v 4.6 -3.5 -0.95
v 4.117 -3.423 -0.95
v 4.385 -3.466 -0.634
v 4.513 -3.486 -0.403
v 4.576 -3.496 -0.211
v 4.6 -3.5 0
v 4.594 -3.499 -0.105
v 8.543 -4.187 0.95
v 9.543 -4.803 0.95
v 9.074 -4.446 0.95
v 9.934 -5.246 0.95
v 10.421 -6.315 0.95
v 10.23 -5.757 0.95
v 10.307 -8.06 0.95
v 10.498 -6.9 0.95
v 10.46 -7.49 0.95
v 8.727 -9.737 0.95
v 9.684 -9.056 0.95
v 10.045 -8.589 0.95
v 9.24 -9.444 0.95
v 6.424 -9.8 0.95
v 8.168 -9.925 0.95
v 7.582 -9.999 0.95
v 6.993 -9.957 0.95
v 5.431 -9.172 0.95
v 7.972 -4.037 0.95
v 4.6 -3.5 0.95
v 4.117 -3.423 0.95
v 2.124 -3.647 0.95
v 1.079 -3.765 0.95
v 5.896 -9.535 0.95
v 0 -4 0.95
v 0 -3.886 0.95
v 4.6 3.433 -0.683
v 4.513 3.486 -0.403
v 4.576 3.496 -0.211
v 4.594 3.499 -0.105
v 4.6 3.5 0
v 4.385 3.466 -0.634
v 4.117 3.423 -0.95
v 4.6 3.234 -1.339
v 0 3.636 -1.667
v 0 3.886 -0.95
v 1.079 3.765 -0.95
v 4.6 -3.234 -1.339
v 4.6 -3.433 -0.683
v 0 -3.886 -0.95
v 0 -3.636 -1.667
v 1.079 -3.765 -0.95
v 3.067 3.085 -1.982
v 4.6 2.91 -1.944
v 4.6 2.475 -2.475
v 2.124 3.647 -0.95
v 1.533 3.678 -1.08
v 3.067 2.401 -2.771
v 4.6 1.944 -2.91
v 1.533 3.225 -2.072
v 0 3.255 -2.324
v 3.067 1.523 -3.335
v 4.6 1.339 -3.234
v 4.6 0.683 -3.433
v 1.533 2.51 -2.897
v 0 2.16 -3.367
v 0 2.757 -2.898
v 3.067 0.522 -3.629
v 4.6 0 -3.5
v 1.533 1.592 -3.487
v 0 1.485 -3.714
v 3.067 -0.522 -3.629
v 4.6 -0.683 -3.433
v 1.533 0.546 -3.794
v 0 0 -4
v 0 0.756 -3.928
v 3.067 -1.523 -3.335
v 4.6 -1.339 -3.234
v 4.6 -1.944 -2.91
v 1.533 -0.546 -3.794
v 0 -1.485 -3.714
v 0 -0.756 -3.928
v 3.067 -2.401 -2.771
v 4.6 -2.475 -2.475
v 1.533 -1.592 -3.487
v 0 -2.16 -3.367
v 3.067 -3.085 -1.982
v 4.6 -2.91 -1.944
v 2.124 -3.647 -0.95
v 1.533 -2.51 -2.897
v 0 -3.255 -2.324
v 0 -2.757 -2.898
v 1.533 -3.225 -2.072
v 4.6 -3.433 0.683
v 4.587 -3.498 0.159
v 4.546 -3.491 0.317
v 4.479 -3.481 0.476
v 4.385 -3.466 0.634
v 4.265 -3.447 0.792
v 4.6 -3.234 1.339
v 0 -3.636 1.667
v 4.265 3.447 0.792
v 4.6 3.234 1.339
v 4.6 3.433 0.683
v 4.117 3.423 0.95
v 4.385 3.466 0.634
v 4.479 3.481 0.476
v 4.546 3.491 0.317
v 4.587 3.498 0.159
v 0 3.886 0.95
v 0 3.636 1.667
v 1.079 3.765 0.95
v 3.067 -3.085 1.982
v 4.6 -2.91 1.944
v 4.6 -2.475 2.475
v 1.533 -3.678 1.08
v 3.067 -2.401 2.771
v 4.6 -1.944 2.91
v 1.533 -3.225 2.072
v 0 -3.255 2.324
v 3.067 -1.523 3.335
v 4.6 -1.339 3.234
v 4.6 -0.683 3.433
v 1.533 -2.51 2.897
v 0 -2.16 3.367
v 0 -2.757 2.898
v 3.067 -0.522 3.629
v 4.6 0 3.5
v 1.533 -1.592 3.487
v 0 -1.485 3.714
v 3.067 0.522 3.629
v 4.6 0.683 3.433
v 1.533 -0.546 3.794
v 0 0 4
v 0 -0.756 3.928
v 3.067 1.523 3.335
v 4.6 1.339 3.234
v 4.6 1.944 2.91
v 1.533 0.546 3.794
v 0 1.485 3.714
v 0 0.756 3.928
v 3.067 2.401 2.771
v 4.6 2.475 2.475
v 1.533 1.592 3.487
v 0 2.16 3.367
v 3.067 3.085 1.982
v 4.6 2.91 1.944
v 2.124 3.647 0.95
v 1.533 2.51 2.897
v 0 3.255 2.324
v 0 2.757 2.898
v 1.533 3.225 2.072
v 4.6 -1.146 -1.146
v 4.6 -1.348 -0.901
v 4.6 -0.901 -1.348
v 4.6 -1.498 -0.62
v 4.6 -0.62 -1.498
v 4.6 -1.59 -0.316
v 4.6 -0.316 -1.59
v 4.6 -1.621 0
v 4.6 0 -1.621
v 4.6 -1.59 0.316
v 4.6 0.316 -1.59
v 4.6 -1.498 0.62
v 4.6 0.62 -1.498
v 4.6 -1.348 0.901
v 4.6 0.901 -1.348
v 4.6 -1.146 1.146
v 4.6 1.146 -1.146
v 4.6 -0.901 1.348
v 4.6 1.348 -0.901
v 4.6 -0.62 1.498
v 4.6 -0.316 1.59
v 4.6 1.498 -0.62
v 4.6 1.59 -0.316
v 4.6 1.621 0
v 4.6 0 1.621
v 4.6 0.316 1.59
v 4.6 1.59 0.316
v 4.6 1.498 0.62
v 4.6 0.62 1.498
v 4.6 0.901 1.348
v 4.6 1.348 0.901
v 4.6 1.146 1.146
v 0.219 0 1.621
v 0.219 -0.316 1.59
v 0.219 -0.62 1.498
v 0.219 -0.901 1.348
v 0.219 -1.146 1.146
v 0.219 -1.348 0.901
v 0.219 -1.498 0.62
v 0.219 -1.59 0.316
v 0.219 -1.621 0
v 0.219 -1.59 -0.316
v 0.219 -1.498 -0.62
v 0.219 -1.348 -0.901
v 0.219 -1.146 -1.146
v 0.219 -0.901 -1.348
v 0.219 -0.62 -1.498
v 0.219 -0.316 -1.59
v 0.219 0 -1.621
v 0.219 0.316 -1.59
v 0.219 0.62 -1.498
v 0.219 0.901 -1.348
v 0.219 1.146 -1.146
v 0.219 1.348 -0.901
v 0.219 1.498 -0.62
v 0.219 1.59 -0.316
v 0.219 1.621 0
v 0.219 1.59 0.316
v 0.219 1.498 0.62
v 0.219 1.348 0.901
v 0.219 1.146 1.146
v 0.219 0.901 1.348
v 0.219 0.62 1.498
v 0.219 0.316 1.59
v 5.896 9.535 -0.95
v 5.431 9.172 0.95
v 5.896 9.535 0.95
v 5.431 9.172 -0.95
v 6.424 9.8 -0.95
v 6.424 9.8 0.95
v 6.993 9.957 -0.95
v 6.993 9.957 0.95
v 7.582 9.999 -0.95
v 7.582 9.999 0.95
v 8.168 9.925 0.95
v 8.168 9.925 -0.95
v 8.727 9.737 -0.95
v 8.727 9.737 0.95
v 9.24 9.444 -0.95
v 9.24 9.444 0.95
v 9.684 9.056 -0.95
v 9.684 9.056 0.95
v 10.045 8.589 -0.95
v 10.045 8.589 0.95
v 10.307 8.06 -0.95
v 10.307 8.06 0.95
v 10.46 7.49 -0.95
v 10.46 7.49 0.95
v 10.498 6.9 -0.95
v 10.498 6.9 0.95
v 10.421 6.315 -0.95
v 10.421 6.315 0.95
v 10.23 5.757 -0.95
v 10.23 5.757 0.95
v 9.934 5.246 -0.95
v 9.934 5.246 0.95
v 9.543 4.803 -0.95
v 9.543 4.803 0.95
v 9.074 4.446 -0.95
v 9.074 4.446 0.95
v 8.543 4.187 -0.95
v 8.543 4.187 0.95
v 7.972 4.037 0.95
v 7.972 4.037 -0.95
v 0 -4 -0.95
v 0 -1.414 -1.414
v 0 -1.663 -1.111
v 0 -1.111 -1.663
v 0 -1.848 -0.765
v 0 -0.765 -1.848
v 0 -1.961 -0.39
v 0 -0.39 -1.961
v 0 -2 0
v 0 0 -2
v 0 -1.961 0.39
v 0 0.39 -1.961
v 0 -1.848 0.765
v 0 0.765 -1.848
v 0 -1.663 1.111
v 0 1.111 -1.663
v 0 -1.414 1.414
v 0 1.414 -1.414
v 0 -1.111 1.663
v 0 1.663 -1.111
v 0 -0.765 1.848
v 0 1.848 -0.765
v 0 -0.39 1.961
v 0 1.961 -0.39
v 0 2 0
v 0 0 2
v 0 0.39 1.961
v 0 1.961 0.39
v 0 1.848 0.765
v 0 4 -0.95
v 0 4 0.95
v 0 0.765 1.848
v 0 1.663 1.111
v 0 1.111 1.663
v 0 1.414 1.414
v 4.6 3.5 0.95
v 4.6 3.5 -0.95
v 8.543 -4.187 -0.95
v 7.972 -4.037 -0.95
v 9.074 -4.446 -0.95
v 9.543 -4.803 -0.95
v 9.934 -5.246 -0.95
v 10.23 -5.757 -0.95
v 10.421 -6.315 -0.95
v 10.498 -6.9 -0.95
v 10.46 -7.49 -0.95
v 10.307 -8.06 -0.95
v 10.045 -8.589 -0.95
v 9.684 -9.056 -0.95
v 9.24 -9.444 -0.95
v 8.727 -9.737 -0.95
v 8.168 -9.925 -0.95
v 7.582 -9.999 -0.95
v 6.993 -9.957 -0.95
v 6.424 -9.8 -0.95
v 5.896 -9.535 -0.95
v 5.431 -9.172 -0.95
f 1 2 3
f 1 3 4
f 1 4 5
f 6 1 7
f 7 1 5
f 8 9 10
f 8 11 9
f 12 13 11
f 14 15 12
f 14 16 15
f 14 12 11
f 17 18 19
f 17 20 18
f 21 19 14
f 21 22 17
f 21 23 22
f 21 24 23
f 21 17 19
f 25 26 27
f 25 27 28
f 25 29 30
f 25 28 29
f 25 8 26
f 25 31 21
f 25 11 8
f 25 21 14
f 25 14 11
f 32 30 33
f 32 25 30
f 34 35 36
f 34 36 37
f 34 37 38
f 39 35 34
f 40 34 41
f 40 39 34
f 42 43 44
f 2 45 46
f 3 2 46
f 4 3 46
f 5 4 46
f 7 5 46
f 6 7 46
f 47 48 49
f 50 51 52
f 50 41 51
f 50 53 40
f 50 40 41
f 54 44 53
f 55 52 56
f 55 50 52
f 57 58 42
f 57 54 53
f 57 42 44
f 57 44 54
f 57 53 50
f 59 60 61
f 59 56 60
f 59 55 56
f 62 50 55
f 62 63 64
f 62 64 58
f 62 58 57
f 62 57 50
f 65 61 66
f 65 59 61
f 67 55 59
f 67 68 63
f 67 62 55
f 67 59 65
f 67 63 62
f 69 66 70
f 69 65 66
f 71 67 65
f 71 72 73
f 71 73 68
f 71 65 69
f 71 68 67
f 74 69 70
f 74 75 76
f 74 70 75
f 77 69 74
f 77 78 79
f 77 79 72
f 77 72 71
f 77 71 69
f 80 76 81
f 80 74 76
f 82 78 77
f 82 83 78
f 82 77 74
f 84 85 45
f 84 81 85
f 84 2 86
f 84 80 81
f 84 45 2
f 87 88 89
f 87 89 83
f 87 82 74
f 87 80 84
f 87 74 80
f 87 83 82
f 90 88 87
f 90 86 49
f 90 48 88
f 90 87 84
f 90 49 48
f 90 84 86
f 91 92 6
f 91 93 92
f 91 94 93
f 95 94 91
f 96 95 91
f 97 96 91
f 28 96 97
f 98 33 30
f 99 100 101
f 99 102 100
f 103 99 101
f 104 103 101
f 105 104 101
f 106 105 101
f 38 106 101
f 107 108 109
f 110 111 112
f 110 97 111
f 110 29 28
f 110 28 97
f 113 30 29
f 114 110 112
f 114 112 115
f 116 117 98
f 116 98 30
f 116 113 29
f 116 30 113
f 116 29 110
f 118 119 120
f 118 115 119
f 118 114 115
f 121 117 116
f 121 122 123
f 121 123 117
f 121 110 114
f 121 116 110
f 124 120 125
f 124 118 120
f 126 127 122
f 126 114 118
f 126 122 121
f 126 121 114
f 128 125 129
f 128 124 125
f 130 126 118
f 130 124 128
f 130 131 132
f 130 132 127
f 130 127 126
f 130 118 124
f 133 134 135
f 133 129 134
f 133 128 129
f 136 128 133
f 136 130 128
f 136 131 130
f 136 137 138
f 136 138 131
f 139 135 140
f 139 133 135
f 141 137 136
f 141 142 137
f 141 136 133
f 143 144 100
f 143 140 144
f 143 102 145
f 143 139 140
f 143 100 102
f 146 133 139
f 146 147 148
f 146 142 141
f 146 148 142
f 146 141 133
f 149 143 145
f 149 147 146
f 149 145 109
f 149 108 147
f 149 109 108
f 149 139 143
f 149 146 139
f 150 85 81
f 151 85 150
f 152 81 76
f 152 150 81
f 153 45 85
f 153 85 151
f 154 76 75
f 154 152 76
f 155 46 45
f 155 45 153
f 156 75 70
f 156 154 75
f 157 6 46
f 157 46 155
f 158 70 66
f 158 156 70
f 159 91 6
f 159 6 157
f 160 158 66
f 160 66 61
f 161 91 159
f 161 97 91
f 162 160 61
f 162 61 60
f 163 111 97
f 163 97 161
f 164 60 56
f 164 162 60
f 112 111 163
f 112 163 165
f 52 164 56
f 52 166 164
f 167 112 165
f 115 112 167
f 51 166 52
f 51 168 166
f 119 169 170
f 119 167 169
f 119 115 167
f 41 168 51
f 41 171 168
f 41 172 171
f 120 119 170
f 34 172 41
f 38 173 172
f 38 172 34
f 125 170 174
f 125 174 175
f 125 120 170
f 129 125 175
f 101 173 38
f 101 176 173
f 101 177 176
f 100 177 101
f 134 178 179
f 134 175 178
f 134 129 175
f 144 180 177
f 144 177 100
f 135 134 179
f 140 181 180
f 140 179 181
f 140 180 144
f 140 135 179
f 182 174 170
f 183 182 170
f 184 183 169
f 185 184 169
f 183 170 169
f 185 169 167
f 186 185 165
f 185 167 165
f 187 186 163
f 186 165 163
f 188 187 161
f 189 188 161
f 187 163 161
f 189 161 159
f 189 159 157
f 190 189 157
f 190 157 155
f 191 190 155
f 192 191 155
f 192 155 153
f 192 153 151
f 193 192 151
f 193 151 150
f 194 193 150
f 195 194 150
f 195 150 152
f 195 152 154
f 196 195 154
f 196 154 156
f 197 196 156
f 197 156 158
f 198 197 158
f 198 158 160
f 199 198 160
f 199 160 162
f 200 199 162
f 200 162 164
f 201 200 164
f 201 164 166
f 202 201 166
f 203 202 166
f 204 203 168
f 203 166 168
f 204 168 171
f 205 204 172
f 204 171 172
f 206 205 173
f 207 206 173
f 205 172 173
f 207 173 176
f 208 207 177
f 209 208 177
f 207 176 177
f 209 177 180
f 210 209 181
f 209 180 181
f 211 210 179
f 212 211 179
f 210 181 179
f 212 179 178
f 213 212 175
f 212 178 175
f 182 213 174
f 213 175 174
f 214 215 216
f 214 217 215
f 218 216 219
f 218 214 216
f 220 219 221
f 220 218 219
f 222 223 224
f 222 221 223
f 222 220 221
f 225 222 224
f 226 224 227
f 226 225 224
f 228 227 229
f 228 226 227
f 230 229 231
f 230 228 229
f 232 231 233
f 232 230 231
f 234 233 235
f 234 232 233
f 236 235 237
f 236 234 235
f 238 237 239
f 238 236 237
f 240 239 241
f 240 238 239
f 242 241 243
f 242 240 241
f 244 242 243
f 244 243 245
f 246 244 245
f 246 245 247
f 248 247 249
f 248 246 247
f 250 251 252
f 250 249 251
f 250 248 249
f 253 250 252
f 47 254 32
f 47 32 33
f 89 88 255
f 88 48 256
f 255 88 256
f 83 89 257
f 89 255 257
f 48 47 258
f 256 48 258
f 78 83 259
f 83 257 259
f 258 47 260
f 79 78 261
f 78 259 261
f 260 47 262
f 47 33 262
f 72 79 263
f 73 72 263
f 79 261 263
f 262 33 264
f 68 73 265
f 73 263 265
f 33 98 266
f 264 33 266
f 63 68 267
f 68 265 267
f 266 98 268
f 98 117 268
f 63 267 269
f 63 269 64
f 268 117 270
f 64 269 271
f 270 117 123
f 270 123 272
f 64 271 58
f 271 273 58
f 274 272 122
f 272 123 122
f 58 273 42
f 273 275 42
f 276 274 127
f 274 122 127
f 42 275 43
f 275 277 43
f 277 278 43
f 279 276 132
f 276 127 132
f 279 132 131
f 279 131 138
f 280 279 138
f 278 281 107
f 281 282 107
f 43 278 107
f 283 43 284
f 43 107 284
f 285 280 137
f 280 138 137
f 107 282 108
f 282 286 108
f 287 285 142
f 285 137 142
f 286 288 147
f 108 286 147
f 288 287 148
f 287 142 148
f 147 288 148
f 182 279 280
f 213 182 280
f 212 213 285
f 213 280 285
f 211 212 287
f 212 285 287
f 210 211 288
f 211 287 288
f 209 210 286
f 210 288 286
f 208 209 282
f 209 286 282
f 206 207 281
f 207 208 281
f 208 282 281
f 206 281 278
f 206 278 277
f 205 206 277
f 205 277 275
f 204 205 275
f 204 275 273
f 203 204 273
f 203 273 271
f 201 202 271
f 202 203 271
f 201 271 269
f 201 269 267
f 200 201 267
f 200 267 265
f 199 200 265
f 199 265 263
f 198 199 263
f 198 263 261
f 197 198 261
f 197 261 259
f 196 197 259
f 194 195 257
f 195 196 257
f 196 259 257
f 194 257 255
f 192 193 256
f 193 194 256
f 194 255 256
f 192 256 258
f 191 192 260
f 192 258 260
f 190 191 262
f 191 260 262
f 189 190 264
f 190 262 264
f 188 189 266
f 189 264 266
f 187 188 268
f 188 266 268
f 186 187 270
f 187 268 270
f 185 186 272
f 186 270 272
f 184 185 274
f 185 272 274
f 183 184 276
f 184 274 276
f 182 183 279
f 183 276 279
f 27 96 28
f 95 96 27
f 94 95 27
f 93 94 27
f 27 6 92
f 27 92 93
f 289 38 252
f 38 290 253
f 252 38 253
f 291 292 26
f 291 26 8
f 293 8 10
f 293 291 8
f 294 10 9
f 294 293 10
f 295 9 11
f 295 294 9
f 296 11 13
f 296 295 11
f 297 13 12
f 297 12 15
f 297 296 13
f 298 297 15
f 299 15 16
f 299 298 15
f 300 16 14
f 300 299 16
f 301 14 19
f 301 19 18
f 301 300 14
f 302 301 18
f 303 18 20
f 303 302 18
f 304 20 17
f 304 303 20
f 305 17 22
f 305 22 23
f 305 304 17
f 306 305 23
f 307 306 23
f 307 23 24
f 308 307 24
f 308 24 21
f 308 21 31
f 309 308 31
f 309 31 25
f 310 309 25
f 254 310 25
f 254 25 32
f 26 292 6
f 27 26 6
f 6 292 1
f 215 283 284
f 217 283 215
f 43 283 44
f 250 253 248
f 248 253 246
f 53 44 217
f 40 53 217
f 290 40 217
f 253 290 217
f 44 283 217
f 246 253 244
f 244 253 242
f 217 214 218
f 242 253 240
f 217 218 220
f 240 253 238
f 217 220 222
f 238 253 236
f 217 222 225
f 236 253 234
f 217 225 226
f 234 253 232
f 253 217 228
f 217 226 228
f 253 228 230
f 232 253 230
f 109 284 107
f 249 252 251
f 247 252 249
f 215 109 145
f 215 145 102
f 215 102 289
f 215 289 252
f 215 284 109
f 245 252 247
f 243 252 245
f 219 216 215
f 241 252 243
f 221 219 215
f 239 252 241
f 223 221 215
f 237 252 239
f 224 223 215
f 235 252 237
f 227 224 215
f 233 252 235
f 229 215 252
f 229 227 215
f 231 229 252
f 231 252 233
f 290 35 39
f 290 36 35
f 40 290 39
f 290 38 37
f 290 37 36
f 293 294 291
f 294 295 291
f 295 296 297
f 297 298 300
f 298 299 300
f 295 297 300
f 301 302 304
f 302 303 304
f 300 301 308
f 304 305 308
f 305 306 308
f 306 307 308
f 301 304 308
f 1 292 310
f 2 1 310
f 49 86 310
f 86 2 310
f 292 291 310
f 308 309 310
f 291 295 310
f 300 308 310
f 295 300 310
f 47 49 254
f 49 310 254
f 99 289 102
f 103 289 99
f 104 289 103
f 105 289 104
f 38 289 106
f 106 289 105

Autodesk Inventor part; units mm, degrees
ref_plane "YZ Plane" through (0, 0, 0) normal (1, 0, 0) x (0, 1, 0)
ref_plane "XZ Plane" through (0, 0, 0) normal (0, 1, 0) x (-1, 0, 0)
sketch "Sketch1" plane through (0, 0, 0) normal (0, 0, 1) x (1, 0, 0)
  line L0 (0, 0) -> (4.6, 0)
  line L1 (0, 0) -> (0, 4)
  line L2 (4.6, 3.5) -> (4.6, 0)
  line L3 (0, 4) -> (5.431, 9.1724)
  line L4 (4.6, 3.5) -> (7.9721, 4.0374)
  arc A0 (7.9721, 4.0374) -> (5.431, 9.1724) centre (7.5, 7) ccw
  line L5 (4.6, 3.5) -> (0, 4)
  line L6 (4.6, 3.5) -> (0, 2.7669)
  dimension "d0" = 7
  dimension "d1" = 7.5
  dimension "d2" = 7
  dimension "d3" = 3
  dimension "d4" = 4.6
  dimension "d5" = 8
revolve "Body" add sketch "Sketch1" angle 360 about axis through (0, 0, 0) along (1, 0, 0) contours L1 L6 L2 L0 | L1 L5 L6
extrude "Wing1" add sketch "Sketch1" along normal mid plane 1.9 contours L1 L5 L6 | L5 L3 A0 L4
fillet "Fillet1" [suppressed]
mirror "Wing2" about plane through (0, 0, 0) normal (0, 1, 0) of "Wing1"
sketch "Sketch2" plane through (0, 0, 0) normal (1, 0, 0) x (0, 1, 0)
  line L0 (0, -14) -> (0, 14) projected
  line L1 (-14, 0) -> (14, 0) projected
  point P0 (0, 0)
hole "Thread" at (0, 0, 0) direction (1, 0, 0) diameter 3.242 end through all thread size "M4x0.7" class "6H" standard "ISO Metric profile"
chamfer "Chamfer1" distance 0.3789 angle 30 1 edges at (0, 0, -1.621) measured on face at (0, -3.1268, -0.0651)
ref_plane "Work Plane1" through (23.9635, 0, 0) normal (0, 0, -1) x (1, 0, 0)
equation "\"d0\" = KOD2"
equation "\"d1\" = KOH1 - RR"
equation "\"d2\" = 0.5 * E0 - RR"
equation "\"d3\" = RR"
equation "\"d4\" = KOH"
equation "\"d5\" = KOD"
equation "\"d6\" = SW"
equation "\"d8\" = 0.333333 * SW"
equation "\"d9\" = -0.5 * GD1 + 0.5 * NND"
equation "\"d109\" = -0.5 * GD1 + 0.5 * NND"
equation "\"NND\" = 4"
equation "\"KOH\" = 4.6"
equation "\"KOH1\" = 10.5"
equation "\"SW\" = 1.9"
equation "\"KOD\" = 8"
equation "\"KOD2\" = 7"
equation "\"RR\" = 3"
equation "\"GUL\" = 0.541266 * PTC"
equation "\"BOR\" = 0"
equation "\"PTC\" = 0.7"
equation "\"THREADDIA\" = 4"
equation "\"TOA\" = 30deg"
equation "\"RR2\" = 2"
equation "\"SW1\" = 2.3"
equation "\"GAL\" = 0.541266 * PTC"
equation "\"E0\" = 20"
equation "\"GD1\" = 3.242228"
properties part number "DIN 315 - M4" material "Steel, Mild"
